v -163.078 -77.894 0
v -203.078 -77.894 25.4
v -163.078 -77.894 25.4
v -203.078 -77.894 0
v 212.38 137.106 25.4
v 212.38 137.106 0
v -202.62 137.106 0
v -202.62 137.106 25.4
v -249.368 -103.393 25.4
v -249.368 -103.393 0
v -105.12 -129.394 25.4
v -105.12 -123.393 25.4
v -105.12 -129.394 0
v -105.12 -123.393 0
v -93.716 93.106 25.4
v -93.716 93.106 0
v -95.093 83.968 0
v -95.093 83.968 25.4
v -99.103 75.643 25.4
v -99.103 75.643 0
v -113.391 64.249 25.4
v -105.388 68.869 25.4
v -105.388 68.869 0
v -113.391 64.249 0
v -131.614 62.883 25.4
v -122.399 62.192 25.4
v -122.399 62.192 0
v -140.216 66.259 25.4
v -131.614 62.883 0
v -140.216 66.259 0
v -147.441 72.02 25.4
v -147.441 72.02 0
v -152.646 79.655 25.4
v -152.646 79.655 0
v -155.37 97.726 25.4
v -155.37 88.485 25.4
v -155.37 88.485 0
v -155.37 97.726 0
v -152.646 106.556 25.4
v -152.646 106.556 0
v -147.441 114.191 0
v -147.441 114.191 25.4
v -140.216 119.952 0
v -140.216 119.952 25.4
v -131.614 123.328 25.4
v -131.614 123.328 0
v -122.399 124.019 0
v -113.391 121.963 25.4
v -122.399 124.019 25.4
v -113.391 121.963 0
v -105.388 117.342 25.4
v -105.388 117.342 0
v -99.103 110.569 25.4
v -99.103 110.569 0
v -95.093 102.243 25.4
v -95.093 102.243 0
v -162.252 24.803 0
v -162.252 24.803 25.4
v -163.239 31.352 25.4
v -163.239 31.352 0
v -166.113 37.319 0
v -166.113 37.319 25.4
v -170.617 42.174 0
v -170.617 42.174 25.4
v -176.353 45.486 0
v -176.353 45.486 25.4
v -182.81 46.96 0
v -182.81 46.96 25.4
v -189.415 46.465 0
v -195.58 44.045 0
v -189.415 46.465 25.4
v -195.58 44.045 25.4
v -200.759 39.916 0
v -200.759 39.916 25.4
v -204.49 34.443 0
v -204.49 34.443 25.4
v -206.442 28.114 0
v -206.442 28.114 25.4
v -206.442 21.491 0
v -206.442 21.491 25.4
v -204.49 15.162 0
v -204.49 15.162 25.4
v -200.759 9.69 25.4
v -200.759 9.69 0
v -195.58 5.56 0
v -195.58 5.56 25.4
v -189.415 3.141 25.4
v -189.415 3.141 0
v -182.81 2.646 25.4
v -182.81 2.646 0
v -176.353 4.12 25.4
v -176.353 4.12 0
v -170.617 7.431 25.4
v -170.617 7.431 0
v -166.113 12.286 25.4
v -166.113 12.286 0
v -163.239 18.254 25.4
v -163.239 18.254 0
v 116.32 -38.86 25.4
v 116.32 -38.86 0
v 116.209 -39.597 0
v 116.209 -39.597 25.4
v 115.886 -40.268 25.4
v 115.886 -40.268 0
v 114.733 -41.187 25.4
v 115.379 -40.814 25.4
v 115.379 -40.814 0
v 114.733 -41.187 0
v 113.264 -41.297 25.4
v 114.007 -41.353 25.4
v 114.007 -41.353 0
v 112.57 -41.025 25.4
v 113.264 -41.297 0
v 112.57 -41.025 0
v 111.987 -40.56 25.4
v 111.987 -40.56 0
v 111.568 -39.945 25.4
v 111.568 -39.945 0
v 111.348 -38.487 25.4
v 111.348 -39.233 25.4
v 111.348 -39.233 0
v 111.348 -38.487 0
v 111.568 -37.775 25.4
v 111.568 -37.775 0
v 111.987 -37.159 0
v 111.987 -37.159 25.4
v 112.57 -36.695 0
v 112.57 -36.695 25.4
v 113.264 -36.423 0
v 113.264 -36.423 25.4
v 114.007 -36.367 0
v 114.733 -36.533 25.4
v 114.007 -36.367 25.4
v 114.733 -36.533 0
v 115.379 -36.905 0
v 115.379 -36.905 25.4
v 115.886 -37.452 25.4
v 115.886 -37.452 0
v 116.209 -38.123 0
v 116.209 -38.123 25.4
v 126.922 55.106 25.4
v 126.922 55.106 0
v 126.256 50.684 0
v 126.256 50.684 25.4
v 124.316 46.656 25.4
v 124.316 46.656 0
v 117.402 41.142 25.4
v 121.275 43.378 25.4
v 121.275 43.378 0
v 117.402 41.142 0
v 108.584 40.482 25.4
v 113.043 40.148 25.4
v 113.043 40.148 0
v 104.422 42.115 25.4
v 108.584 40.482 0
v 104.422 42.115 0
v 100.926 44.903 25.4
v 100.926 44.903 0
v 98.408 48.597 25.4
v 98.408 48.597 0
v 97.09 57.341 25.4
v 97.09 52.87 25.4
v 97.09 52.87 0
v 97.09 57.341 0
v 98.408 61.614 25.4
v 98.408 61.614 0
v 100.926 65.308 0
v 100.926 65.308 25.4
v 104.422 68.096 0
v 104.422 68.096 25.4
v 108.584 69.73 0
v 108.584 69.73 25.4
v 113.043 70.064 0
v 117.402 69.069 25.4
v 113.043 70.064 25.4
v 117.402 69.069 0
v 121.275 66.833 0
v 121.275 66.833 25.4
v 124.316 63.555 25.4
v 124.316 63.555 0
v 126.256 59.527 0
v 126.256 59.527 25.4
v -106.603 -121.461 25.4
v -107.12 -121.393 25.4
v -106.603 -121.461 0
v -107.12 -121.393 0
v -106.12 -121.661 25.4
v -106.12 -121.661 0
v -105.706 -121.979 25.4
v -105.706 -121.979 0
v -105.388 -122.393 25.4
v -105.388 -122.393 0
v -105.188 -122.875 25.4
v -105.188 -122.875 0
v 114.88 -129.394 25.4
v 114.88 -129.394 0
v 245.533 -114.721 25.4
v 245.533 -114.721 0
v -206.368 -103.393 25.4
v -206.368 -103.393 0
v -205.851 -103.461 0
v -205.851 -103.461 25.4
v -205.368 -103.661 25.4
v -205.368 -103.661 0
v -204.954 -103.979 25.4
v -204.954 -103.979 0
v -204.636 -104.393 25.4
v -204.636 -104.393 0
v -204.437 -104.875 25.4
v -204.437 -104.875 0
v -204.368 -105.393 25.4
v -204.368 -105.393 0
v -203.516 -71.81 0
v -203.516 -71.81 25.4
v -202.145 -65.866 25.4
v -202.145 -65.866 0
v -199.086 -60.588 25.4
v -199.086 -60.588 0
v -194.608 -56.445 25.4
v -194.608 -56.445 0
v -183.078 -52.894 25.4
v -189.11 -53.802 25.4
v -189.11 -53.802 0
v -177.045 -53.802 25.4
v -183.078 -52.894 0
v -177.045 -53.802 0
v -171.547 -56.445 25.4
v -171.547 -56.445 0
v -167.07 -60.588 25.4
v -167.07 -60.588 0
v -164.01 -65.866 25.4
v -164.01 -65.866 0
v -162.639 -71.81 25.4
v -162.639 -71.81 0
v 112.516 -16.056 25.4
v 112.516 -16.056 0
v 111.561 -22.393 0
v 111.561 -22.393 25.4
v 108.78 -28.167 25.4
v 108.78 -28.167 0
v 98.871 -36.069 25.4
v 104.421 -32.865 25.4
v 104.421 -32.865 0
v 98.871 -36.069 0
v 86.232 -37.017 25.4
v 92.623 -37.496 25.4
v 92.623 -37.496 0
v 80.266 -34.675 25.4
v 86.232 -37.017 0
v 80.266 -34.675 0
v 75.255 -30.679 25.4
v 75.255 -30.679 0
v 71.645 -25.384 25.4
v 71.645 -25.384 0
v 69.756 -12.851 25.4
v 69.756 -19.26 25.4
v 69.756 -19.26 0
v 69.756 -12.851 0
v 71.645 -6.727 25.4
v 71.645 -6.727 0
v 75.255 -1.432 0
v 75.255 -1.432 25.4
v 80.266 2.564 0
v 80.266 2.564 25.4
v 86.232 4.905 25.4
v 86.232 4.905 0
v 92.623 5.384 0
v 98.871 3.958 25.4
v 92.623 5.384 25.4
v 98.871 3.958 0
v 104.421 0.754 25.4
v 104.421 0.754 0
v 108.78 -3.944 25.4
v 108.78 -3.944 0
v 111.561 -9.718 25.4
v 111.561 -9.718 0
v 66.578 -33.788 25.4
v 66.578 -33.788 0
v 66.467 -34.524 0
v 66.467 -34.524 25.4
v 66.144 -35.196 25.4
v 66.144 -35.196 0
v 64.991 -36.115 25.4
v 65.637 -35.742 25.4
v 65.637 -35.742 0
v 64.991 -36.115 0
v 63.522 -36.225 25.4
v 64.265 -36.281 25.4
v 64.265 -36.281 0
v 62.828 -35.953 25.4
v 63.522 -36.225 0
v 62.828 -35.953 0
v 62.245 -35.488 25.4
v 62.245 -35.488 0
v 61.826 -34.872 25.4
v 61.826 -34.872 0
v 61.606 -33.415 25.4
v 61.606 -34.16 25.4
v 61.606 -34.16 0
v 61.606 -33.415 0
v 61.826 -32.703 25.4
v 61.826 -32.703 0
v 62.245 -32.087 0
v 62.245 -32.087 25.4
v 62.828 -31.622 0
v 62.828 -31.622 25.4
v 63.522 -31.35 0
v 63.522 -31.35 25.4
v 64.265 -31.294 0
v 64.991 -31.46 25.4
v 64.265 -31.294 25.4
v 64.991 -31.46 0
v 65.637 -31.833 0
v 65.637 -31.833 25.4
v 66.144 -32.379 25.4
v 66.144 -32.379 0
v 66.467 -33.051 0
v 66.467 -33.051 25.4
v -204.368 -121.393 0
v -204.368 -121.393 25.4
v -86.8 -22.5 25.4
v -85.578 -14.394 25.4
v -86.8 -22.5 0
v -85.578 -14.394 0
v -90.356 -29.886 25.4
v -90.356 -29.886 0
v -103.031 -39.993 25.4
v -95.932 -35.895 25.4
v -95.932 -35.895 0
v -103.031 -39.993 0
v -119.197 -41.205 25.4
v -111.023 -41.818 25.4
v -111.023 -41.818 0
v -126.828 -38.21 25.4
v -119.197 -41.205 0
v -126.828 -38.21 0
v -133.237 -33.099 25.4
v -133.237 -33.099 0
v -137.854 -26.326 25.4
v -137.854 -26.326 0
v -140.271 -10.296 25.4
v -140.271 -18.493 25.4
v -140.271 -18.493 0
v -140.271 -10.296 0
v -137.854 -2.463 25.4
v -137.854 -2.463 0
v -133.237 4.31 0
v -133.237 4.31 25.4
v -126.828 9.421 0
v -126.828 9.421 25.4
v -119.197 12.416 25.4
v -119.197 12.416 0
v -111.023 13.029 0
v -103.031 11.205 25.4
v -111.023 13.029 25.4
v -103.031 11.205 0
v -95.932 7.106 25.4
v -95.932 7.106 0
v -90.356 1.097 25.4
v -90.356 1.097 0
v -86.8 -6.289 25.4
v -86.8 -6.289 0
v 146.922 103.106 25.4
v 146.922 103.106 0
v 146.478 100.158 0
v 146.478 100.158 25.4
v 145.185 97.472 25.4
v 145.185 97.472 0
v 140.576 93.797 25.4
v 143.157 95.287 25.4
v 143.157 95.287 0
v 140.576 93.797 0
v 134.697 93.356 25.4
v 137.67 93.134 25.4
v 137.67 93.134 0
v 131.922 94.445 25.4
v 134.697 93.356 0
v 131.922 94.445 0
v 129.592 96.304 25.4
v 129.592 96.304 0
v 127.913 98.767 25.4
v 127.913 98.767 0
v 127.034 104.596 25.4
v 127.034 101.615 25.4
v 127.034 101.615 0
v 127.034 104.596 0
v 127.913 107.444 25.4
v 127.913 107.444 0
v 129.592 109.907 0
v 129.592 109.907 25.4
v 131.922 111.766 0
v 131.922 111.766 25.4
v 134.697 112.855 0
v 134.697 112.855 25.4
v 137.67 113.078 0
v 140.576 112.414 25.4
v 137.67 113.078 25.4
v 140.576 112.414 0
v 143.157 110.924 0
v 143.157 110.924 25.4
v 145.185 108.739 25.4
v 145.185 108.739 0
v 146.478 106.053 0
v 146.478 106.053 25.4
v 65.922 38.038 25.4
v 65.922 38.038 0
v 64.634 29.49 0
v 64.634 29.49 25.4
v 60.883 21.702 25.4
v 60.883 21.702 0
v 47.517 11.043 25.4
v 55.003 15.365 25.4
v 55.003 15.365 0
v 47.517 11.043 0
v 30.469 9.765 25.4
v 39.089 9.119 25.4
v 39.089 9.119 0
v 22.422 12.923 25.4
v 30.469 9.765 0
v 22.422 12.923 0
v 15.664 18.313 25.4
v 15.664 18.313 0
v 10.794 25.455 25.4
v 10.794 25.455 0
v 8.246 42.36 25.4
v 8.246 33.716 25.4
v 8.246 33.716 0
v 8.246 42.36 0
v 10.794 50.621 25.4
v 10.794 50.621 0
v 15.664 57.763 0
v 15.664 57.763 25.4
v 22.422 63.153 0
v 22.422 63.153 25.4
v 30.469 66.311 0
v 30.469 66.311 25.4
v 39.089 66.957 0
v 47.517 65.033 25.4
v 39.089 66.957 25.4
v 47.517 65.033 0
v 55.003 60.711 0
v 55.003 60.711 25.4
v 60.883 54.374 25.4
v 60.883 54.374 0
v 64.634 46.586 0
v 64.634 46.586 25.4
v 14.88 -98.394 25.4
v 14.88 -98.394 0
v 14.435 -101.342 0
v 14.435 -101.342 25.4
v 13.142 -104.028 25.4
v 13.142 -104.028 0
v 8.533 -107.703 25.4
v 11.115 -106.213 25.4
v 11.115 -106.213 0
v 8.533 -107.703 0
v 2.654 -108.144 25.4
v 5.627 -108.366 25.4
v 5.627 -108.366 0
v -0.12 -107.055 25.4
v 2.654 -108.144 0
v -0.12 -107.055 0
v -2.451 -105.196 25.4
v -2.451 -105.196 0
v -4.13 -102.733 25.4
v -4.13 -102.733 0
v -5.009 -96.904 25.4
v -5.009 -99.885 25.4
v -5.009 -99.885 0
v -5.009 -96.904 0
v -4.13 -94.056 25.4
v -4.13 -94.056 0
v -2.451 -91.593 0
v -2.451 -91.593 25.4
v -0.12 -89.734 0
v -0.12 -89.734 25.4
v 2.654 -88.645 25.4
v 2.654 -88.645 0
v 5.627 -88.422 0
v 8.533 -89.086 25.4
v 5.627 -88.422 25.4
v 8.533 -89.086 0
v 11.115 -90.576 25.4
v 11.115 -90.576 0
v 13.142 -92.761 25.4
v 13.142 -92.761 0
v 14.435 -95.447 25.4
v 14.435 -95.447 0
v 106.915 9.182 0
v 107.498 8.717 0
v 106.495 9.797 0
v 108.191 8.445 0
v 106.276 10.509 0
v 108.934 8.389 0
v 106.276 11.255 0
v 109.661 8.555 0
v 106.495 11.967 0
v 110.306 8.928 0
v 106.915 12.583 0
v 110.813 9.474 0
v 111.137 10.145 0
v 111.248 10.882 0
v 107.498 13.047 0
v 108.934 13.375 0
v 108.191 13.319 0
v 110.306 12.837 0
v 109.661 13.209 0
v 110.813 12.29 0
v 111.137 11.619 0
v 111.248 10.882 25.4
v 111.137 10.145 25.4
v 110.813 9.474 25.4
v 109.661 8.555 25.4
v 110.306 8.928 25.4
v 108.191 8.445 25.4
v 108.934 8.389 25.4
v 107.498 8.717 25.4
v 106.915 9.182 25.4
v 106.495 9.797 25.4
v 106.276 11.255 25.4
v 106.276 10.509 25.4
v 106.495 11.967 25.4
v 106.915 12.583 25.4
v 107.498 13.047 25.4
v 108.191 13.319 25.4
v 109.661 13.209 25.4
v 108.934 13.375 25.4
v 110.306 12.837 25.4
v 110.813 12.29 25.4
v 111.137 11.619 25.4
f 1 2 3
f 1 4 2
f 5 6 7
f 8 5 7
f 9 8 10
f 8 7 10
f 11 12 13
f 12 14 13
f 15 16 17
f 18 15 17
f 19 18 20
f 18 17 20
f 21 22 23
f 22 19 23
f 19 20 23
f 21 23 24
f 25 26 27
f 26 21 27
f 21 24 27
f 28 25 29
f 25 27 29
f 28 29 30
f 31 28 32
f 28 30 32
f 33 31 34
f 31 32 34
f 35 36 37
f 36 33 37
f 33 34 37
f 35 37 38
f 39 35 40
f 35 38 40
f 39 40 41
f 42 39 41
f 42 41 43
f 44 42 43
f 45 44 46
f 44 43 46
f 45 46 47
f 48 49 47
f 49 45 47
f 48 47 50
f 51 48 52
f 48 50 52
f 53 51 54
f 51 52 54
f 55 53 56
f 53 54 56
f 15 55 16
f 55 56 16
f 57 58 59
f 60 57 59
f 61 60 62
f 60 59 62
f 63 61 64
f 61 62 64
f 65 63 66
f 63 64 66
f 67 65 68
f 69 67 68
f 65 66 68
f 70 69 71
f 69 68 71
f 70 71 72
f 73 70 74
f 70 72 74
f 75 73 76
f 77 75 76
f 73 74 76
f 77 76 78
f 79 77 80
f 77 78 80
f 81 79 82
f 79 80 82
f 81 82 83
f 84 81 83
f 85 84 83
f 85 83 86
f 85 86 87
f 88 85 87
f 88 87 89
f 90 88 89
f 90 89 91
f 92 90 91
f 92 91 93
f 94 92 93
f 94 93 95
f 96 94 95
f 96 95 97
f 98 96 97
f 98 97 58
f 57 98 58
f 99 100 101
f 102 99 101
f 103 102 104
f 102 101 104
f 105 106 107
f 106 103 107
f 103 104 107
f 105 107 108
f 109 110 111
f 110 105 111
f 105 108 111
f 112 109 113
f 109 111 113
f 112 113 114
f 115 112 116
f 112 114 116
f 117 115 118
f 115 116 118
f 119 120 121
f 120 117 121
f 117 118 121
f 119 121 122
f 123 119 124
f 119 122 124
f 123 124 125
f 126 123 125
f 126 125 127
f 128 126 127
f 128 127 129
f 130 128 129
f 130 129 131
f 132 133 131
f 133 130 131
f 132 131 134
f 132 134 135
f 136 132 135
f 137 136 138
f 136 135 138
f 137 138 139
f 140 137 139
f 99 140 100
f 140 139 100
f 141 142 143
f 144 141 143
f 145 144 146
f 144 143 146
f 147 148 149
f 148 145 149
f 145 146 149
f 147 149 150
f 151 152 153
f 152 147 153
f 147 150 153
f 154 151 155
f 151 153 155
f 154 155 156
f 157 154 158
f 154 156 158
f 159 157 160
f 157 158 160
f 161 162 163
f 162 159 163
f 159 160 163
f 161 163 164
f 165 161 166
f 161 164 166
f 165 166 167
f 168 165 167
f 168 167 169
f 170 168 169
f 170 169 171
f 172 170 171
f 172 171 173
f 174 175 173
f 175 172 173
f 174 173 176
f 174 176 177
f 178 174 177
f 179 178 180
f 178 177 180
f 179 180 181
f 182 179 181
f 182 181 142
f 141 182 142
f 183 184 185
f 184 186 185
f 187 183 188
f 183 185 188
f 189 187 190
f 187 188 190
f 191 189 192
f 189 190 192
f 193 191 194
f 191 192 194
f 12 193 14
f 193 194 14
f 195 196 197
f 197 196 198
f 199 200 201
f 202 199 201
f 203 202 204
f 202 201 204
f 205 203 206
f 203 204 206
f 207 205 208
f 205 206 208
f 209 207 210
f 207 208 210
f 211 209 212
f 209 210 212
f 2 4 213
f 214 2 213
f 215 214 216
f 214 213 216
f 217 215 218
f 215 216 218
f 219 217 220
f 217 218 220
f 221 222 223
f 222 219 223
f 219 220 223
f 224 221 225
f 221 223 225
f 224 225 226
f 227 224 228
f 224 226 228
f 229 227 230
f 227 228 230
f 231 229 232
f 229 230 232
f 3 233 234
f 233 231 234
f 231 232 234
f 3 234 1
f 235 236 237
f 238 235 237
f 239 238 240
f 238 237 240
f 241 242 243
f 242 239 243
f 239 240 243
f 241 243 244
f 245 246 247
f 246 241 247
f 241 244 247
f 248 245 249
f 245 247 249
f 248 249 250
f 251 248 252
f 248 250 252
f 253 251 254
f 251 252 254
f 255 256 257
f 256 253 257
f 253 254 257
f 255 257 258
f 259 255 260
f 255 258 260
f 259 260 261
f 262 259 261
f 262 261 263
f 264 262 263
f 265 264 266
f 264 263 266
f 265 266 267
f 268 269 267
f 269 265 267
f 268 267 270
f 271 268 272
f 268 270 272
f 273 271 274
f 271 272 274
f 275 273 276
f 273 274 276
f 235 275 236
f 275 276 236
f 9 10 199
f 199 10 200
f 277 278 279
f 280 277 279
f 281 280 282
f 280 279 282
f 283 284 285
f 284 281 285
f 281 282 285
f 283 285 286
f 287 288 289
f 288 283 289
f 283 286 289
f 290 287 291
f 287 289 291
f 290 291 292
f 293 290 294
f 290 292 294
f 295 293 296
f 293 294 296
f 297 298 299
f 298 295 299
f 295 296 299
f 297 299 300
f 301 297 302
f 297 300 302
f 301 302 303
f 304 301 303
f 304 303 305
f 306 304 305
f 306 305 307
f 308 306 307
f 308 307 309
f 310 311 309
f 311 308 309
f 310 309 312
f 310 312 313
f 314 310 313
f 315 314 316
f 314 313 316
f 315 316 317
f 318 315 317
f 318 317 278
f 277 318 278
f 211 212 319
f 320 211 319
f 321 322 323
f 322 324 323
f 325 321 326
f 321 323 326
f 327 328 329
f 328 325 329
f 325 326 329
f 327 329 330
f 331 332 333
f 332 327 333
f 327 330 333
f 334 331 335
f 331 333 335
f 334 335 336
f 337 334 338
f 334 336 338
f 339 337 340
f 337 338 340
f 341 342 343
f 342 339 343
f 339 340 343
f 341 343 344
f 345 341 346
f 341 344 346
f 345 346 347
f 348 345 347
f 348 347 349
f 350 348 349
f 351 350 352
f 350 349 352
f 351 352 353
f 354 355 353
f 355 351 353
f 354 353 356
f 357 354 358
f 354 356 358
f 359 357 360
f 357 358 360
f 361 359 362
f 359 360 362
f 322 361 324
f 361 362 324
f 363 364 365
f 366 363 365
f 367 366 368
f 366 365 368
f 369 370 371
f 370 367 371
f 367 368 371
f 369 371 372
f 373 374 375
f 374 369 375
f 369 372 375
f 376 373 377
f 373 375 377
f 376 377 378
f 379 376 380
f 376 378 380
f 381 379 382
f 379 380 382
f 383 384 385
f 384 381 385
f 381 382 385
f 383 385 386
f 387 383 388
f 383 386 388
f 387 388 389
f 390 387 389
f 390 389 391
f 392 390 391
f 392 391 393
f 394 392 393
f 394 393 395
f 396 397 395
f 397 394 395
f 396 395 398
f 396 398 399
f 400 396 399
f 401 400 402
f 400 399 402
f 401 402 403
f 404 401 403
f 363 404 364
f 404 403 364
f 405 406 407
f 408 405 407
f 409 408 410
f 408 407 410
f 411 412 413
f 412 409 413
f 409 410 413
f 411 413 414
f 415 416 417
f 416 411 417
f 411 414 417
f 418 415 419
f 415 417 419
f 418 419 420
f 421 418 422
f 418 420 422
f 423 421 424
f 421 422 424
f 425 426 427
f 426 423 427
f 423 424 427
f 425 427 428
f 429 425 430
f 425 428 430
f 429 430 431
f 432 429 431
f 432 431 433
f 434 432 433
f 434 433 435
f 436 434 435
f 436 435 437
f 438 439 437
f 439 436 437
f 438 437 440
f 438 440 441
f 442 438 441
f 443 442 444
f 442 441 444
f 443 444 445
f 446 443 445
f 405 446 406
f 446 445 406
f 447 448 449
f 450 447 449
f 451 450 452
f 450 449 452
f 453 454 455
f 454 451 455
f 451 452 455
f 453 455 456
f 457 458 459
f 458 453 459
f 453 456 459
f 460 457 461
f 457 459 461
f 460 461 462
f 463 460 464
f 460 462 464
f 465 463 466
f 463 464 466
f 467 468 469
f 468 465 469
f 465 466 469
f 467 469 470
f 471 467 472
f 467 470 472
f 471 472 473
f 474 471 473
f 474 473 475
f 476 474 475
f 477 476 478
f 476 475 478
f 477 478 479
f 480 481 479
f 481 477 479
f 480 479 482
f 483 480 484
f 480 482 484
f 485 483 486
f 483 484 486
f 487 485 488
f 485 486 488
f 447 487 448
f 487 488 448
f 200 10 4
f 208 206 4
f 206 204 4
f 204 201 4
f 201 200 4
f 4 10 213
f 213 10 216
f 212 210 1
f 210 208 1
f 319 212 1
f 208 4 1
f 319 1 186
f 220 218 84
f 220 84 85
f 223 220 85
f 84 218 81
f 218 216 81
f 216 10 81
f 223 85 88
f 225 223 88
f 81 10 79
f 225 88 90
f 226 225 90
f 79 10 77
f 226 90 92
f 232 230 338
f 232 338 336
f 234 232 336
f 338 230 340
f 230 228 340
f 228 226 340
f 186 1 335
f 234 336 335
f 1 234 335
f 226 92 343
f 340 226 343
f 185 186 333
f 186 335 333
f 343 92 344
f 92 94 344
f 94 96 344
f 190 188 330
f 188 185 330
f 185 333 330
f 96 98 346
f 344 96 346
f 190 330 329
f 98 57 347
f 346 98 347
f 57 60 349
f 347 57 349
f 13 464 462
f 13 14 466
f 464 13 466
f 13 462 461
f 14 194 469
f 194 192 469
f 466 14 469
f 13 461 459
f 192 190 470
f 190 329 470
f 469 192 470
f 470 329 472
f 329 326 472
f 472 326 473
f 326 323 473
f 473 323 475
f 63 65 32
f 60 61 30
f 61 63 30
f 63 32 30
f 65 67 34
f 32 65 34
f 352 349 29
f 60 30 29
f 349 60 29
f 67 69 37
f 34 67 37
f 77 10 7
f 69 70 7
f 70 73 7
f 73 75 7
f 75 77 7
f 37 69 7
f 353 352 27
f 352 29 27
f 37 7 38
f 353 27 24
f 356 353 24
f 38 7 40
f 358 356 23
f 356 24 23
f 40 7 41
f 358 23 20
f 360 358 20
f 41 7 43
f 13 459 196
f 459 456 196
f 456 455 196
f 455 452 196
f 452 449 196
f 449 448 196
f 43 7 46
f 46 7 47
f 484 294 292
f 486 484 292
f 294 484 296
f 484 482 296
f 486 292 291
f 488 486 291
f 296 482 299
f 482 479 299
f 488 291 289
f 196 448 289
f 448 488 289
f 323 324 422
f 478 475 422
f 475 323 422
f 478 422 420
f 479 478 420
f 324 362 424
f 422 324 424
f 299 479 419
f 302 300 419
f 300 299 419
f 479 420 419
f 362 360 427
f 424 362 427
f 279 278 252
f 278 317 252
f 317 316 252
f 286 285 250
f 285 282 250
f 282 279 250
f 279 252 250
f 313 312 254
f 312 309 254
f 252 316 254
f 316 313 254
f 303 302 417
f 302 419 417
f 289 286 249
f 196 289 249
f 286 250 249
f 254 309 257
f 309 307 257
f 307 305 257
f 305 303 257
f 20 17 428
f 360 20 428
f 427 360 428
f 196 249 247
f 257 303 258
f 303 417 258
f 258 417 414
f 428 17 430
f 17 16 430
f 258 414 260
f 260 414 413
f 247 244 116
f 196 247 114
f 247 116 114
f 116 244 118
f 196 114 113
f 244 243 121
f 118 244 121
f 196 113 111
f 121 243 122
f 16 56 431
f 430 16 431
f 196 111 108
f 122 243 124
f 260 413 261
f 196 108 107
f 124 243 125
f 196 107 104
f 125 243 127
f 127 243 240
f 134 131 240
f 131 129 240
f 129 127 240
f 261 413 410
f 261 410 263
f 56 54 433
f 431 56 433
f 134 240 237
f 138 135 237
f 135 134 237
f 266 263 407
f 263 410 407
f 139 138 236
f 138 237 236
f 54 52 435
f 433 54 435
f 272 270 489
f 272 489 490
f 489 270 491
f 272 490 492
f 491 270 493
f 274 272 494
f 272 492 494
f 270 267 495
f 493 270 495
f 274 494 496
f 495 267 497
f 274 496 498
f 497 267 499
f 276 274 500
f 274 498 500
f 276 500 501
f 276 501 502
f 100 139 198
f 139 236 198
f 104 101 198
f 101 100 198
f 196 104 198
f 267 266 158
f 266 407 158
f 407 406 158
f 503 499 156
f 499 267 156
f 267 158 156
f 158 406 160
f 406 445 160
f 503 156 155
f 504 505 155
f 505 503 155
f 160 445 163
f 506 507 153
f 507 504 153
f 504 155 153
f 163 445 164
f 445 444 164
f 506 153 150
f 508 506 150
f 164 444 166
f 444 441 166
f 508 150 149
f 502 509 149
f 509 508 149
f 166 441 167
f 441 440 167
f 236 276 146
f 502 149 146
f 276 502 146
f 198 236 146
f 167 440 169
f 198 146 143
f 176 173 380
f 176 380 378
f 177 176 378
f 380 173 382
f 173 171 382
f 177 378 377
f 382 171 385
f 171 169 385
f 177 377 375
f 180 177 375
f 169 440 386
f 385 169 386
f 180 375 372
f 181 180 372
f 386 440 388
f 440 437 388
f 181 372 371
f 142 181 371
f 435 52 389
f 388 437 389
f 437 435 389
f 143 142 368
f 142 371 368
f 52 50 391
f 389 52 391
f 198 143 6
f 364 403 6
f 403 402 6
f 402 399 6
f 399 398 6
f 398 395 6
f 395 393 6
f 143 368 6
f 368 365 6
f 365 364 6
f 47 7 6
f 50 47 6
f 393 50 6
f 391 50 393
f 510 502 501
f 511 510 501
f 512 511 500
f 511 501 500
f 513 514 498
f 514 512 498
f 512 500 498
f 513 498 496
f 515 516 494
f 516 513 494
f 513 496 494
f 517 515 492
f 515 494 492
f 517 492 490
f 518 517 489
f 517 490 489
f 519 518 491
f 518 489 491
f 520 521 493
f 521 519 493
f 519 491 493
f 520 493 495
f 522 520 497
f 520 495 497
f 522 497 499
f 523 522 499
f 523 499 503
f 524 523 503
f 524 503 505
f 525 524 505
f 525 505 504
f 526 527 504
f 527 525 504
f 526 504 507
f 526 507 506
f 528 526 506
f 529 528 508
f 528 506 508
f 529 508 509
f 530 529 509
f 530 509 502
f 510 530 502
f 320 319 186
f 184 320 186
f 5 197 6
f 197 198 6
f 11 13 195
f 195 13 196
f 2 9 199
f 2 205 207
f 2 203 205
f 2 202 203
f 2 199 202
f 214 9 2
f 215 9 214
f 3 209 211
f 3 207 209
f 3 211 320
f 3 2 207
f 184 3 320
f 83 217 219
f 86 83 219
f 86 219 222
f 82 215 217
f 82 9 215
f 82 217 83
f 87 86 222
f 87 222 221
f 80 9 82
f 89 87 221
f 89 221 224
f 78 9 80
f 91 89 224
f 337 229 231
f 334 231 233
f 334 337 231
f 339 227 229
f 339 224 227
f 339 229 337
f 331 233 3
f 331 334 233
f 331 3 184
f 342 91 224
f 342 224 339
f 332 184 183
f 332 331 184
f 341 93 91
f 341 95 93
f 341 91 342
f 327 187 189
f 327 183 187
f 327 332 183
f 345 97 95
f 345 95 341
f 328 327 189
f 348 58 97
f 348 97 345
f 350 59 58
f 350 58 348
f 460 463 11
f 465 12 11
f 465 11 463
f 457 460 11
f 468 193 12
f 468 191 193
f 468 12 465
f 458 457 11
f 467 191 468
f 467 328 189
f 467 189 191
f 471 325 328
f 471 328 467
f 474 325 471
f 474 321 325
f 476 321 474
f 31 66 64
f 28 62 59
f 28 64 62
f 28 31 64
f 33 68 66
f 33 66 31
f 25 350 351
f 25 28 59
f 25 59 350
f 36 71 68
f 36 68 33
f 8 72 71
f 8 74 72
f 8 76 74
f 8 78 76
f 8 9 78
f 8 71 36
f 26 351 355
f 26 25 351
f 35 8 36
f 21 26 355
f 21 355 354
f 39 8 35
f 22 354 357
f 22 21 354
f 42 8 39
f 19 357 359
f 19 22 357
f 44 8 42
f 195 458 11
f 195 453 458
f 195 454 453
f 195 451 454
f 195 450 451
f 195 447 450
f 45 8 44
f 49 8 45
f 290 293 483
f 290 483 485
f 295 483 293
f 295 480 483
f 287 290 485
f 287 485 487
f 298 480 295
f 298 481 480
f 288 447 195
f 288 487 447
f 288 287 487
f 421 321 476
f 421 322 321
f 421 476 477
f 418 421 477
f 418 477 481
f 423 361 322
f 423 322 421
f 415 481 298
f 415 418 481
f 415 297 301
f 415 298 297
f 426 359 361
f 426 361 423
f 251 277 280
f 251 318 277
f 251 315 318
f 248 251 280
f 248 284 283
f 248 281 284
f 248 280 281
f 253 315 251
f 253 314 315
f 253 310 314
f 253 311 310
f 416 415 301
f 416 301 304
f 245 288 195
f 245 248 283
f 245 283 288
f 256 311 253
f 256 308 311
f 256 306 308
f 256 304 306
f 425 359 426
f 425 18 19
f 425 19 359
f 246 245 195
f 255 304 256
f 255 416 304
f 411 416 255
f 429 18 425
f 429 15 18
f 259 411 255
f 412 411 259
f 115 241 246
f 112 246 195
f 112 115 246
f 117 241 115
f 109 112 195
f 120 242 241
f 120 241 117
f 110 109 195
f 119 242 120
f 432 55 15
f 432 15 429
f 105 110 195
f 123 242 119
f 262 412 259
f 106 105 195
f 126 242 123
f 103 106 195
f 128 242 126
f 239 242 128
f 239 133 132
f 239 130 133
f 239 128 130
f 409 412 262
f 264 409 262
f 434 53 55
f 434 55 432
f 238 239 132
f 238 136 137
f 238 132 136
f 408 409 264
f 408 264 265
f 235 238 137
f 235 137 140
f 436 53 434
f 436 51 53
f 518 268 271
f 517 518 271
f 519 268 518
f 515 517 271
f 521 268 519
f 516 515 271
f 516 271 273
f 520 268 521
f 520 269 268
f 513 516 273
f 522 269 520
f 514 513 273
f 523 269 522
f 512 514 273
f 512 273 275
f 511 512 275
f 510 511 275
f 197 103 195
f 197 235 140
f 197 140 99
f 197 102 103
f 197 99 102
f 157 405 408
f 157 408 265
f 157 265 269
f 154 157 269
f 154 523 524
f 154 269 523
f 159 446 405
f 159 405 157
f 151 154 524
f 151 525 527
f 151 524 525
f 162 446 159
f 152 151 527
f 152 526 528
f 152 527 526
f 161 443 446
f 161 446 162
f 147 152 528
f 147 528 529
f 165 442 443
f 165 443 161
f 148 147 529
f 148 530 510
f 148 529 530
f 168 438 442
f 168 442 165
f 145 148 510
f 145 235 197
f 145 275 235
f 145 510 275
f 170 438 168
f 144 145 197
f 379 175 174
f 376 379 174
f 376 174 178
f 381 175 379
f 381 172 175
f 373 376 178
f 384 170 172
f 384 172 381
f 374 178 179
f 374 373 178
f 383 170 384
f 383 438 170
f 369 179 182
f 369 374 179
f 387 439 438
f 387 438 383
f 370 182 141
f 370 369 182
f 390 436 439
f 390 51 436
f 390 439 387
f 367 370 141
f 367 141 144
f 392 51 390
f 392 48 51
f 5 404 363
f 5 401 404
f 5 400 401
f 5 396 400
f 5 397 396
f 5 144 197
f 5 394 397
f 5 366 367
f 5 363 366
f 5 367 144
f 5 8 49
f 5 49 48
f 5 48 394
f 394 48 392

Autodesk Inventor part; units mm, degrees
ref_plane "YZ Plane" through (0, 0, 0) normal (1, 0, 0) x (0, 1, 0)
ref_plane "XZ Plane" through (0, 0, 0) normal (0, 1, 0) x (-1, 0, 0)
ref_plane "XY Plane" through (0, 0, 0) normal (0, 0, 1) x (1, 0, 0)
ref_plane "Work Plane1" through (0, 0, 0) normal (0, 0, 1) x (1, 0, 0)
sketch "Sketch1" plane through (0, 0, 0) normal (0, 0, 1) x (1, 0, 0)
  circle A0 centre (64.078, -33.7875) radius 2.5 projected
  circle A1 centre (113.8201, -38.8599) radius 2.5 projected
  circle A2 centre (108.7476, 10.8821) radius 2.5 projected
  circle A3 centre (91.0159, -16.0557) radius 21.5 projected
  circle A4 centre (136.9222, 103.1056) radius 10 projected
  circle A5 centre (-113.0778, -14.3944) radius 27.5 projected
  circle A6 centre (-124.7161, 93.1056) radius 31 projected
  circle A7 centre (111.9222, 55.1056) radius 15 projected
  arc A8 (-163.0778, -77.8944) -> (-203.0778, -77.8944) centre (-183.0778, -73.3944) ccw projected
  line L0 (-203.0778, -77.8944) -> (-163.0778, -77.8944) projected
  circle A9 centre (4.8797, -98.3944) radius 10 projected
  circle A10 centre (36.9222, 38.038) radius 29 projected
  line L1 (-105.1203, -129.3944) -> (114.8797, -129.3944) projected
  line L2 (114.8797, -129.3944) -> (245.5334, -114.7214) projected
  line L3 (245.5334, -114.7214) -> (212.3797, 137.1056) projected
  line L4 (212.3797, 137.1056) -> (-202.6203, 137.1056) projected
  line L5 (-202.6203, 137.1056) -> (-249.3685, -103.3931) projected
  line L6 (-249.3685, -103.3931) -> (-206.3685, -103.3931) projected
  arc A11 (-204.3685, -105.3931) -> (-206.3685, -103.3931) centre (-206.3685, -105.3931) ccw projected
  line L7 (-204.3685, -105.3931) -> (-204.3685, -121.3931) projected
  line L8 (-204.3685, -121.3931) -> (-107.1203, -121.3931) projected
  arc A12 (-105.1203, -123.3931) -> (-107.1203, -121.3931) centre (-107.1203, -123.3931) ccw projected
  line L9 (-105.1203, -123.3931) -> (-105.1203, -129.3944) projected
  point P0 (0, 0)
extrude "Extrusion1" add sketch "Sketch1" along normal blind 25.4
sketch "Sketch2" plane through (0, 0, 25.4) normal (0, 0, 1) x (1, 0, 0)
  circle A0 centre (-184.4709, 24.8028) radius 22.2192
  point P0 (0, 0)
  dimension "Hole" = 44.4384
extrude "Extrusion2" cut sketch "Sketch2" against normal through all
properties part number "Part11.ipt-01"
